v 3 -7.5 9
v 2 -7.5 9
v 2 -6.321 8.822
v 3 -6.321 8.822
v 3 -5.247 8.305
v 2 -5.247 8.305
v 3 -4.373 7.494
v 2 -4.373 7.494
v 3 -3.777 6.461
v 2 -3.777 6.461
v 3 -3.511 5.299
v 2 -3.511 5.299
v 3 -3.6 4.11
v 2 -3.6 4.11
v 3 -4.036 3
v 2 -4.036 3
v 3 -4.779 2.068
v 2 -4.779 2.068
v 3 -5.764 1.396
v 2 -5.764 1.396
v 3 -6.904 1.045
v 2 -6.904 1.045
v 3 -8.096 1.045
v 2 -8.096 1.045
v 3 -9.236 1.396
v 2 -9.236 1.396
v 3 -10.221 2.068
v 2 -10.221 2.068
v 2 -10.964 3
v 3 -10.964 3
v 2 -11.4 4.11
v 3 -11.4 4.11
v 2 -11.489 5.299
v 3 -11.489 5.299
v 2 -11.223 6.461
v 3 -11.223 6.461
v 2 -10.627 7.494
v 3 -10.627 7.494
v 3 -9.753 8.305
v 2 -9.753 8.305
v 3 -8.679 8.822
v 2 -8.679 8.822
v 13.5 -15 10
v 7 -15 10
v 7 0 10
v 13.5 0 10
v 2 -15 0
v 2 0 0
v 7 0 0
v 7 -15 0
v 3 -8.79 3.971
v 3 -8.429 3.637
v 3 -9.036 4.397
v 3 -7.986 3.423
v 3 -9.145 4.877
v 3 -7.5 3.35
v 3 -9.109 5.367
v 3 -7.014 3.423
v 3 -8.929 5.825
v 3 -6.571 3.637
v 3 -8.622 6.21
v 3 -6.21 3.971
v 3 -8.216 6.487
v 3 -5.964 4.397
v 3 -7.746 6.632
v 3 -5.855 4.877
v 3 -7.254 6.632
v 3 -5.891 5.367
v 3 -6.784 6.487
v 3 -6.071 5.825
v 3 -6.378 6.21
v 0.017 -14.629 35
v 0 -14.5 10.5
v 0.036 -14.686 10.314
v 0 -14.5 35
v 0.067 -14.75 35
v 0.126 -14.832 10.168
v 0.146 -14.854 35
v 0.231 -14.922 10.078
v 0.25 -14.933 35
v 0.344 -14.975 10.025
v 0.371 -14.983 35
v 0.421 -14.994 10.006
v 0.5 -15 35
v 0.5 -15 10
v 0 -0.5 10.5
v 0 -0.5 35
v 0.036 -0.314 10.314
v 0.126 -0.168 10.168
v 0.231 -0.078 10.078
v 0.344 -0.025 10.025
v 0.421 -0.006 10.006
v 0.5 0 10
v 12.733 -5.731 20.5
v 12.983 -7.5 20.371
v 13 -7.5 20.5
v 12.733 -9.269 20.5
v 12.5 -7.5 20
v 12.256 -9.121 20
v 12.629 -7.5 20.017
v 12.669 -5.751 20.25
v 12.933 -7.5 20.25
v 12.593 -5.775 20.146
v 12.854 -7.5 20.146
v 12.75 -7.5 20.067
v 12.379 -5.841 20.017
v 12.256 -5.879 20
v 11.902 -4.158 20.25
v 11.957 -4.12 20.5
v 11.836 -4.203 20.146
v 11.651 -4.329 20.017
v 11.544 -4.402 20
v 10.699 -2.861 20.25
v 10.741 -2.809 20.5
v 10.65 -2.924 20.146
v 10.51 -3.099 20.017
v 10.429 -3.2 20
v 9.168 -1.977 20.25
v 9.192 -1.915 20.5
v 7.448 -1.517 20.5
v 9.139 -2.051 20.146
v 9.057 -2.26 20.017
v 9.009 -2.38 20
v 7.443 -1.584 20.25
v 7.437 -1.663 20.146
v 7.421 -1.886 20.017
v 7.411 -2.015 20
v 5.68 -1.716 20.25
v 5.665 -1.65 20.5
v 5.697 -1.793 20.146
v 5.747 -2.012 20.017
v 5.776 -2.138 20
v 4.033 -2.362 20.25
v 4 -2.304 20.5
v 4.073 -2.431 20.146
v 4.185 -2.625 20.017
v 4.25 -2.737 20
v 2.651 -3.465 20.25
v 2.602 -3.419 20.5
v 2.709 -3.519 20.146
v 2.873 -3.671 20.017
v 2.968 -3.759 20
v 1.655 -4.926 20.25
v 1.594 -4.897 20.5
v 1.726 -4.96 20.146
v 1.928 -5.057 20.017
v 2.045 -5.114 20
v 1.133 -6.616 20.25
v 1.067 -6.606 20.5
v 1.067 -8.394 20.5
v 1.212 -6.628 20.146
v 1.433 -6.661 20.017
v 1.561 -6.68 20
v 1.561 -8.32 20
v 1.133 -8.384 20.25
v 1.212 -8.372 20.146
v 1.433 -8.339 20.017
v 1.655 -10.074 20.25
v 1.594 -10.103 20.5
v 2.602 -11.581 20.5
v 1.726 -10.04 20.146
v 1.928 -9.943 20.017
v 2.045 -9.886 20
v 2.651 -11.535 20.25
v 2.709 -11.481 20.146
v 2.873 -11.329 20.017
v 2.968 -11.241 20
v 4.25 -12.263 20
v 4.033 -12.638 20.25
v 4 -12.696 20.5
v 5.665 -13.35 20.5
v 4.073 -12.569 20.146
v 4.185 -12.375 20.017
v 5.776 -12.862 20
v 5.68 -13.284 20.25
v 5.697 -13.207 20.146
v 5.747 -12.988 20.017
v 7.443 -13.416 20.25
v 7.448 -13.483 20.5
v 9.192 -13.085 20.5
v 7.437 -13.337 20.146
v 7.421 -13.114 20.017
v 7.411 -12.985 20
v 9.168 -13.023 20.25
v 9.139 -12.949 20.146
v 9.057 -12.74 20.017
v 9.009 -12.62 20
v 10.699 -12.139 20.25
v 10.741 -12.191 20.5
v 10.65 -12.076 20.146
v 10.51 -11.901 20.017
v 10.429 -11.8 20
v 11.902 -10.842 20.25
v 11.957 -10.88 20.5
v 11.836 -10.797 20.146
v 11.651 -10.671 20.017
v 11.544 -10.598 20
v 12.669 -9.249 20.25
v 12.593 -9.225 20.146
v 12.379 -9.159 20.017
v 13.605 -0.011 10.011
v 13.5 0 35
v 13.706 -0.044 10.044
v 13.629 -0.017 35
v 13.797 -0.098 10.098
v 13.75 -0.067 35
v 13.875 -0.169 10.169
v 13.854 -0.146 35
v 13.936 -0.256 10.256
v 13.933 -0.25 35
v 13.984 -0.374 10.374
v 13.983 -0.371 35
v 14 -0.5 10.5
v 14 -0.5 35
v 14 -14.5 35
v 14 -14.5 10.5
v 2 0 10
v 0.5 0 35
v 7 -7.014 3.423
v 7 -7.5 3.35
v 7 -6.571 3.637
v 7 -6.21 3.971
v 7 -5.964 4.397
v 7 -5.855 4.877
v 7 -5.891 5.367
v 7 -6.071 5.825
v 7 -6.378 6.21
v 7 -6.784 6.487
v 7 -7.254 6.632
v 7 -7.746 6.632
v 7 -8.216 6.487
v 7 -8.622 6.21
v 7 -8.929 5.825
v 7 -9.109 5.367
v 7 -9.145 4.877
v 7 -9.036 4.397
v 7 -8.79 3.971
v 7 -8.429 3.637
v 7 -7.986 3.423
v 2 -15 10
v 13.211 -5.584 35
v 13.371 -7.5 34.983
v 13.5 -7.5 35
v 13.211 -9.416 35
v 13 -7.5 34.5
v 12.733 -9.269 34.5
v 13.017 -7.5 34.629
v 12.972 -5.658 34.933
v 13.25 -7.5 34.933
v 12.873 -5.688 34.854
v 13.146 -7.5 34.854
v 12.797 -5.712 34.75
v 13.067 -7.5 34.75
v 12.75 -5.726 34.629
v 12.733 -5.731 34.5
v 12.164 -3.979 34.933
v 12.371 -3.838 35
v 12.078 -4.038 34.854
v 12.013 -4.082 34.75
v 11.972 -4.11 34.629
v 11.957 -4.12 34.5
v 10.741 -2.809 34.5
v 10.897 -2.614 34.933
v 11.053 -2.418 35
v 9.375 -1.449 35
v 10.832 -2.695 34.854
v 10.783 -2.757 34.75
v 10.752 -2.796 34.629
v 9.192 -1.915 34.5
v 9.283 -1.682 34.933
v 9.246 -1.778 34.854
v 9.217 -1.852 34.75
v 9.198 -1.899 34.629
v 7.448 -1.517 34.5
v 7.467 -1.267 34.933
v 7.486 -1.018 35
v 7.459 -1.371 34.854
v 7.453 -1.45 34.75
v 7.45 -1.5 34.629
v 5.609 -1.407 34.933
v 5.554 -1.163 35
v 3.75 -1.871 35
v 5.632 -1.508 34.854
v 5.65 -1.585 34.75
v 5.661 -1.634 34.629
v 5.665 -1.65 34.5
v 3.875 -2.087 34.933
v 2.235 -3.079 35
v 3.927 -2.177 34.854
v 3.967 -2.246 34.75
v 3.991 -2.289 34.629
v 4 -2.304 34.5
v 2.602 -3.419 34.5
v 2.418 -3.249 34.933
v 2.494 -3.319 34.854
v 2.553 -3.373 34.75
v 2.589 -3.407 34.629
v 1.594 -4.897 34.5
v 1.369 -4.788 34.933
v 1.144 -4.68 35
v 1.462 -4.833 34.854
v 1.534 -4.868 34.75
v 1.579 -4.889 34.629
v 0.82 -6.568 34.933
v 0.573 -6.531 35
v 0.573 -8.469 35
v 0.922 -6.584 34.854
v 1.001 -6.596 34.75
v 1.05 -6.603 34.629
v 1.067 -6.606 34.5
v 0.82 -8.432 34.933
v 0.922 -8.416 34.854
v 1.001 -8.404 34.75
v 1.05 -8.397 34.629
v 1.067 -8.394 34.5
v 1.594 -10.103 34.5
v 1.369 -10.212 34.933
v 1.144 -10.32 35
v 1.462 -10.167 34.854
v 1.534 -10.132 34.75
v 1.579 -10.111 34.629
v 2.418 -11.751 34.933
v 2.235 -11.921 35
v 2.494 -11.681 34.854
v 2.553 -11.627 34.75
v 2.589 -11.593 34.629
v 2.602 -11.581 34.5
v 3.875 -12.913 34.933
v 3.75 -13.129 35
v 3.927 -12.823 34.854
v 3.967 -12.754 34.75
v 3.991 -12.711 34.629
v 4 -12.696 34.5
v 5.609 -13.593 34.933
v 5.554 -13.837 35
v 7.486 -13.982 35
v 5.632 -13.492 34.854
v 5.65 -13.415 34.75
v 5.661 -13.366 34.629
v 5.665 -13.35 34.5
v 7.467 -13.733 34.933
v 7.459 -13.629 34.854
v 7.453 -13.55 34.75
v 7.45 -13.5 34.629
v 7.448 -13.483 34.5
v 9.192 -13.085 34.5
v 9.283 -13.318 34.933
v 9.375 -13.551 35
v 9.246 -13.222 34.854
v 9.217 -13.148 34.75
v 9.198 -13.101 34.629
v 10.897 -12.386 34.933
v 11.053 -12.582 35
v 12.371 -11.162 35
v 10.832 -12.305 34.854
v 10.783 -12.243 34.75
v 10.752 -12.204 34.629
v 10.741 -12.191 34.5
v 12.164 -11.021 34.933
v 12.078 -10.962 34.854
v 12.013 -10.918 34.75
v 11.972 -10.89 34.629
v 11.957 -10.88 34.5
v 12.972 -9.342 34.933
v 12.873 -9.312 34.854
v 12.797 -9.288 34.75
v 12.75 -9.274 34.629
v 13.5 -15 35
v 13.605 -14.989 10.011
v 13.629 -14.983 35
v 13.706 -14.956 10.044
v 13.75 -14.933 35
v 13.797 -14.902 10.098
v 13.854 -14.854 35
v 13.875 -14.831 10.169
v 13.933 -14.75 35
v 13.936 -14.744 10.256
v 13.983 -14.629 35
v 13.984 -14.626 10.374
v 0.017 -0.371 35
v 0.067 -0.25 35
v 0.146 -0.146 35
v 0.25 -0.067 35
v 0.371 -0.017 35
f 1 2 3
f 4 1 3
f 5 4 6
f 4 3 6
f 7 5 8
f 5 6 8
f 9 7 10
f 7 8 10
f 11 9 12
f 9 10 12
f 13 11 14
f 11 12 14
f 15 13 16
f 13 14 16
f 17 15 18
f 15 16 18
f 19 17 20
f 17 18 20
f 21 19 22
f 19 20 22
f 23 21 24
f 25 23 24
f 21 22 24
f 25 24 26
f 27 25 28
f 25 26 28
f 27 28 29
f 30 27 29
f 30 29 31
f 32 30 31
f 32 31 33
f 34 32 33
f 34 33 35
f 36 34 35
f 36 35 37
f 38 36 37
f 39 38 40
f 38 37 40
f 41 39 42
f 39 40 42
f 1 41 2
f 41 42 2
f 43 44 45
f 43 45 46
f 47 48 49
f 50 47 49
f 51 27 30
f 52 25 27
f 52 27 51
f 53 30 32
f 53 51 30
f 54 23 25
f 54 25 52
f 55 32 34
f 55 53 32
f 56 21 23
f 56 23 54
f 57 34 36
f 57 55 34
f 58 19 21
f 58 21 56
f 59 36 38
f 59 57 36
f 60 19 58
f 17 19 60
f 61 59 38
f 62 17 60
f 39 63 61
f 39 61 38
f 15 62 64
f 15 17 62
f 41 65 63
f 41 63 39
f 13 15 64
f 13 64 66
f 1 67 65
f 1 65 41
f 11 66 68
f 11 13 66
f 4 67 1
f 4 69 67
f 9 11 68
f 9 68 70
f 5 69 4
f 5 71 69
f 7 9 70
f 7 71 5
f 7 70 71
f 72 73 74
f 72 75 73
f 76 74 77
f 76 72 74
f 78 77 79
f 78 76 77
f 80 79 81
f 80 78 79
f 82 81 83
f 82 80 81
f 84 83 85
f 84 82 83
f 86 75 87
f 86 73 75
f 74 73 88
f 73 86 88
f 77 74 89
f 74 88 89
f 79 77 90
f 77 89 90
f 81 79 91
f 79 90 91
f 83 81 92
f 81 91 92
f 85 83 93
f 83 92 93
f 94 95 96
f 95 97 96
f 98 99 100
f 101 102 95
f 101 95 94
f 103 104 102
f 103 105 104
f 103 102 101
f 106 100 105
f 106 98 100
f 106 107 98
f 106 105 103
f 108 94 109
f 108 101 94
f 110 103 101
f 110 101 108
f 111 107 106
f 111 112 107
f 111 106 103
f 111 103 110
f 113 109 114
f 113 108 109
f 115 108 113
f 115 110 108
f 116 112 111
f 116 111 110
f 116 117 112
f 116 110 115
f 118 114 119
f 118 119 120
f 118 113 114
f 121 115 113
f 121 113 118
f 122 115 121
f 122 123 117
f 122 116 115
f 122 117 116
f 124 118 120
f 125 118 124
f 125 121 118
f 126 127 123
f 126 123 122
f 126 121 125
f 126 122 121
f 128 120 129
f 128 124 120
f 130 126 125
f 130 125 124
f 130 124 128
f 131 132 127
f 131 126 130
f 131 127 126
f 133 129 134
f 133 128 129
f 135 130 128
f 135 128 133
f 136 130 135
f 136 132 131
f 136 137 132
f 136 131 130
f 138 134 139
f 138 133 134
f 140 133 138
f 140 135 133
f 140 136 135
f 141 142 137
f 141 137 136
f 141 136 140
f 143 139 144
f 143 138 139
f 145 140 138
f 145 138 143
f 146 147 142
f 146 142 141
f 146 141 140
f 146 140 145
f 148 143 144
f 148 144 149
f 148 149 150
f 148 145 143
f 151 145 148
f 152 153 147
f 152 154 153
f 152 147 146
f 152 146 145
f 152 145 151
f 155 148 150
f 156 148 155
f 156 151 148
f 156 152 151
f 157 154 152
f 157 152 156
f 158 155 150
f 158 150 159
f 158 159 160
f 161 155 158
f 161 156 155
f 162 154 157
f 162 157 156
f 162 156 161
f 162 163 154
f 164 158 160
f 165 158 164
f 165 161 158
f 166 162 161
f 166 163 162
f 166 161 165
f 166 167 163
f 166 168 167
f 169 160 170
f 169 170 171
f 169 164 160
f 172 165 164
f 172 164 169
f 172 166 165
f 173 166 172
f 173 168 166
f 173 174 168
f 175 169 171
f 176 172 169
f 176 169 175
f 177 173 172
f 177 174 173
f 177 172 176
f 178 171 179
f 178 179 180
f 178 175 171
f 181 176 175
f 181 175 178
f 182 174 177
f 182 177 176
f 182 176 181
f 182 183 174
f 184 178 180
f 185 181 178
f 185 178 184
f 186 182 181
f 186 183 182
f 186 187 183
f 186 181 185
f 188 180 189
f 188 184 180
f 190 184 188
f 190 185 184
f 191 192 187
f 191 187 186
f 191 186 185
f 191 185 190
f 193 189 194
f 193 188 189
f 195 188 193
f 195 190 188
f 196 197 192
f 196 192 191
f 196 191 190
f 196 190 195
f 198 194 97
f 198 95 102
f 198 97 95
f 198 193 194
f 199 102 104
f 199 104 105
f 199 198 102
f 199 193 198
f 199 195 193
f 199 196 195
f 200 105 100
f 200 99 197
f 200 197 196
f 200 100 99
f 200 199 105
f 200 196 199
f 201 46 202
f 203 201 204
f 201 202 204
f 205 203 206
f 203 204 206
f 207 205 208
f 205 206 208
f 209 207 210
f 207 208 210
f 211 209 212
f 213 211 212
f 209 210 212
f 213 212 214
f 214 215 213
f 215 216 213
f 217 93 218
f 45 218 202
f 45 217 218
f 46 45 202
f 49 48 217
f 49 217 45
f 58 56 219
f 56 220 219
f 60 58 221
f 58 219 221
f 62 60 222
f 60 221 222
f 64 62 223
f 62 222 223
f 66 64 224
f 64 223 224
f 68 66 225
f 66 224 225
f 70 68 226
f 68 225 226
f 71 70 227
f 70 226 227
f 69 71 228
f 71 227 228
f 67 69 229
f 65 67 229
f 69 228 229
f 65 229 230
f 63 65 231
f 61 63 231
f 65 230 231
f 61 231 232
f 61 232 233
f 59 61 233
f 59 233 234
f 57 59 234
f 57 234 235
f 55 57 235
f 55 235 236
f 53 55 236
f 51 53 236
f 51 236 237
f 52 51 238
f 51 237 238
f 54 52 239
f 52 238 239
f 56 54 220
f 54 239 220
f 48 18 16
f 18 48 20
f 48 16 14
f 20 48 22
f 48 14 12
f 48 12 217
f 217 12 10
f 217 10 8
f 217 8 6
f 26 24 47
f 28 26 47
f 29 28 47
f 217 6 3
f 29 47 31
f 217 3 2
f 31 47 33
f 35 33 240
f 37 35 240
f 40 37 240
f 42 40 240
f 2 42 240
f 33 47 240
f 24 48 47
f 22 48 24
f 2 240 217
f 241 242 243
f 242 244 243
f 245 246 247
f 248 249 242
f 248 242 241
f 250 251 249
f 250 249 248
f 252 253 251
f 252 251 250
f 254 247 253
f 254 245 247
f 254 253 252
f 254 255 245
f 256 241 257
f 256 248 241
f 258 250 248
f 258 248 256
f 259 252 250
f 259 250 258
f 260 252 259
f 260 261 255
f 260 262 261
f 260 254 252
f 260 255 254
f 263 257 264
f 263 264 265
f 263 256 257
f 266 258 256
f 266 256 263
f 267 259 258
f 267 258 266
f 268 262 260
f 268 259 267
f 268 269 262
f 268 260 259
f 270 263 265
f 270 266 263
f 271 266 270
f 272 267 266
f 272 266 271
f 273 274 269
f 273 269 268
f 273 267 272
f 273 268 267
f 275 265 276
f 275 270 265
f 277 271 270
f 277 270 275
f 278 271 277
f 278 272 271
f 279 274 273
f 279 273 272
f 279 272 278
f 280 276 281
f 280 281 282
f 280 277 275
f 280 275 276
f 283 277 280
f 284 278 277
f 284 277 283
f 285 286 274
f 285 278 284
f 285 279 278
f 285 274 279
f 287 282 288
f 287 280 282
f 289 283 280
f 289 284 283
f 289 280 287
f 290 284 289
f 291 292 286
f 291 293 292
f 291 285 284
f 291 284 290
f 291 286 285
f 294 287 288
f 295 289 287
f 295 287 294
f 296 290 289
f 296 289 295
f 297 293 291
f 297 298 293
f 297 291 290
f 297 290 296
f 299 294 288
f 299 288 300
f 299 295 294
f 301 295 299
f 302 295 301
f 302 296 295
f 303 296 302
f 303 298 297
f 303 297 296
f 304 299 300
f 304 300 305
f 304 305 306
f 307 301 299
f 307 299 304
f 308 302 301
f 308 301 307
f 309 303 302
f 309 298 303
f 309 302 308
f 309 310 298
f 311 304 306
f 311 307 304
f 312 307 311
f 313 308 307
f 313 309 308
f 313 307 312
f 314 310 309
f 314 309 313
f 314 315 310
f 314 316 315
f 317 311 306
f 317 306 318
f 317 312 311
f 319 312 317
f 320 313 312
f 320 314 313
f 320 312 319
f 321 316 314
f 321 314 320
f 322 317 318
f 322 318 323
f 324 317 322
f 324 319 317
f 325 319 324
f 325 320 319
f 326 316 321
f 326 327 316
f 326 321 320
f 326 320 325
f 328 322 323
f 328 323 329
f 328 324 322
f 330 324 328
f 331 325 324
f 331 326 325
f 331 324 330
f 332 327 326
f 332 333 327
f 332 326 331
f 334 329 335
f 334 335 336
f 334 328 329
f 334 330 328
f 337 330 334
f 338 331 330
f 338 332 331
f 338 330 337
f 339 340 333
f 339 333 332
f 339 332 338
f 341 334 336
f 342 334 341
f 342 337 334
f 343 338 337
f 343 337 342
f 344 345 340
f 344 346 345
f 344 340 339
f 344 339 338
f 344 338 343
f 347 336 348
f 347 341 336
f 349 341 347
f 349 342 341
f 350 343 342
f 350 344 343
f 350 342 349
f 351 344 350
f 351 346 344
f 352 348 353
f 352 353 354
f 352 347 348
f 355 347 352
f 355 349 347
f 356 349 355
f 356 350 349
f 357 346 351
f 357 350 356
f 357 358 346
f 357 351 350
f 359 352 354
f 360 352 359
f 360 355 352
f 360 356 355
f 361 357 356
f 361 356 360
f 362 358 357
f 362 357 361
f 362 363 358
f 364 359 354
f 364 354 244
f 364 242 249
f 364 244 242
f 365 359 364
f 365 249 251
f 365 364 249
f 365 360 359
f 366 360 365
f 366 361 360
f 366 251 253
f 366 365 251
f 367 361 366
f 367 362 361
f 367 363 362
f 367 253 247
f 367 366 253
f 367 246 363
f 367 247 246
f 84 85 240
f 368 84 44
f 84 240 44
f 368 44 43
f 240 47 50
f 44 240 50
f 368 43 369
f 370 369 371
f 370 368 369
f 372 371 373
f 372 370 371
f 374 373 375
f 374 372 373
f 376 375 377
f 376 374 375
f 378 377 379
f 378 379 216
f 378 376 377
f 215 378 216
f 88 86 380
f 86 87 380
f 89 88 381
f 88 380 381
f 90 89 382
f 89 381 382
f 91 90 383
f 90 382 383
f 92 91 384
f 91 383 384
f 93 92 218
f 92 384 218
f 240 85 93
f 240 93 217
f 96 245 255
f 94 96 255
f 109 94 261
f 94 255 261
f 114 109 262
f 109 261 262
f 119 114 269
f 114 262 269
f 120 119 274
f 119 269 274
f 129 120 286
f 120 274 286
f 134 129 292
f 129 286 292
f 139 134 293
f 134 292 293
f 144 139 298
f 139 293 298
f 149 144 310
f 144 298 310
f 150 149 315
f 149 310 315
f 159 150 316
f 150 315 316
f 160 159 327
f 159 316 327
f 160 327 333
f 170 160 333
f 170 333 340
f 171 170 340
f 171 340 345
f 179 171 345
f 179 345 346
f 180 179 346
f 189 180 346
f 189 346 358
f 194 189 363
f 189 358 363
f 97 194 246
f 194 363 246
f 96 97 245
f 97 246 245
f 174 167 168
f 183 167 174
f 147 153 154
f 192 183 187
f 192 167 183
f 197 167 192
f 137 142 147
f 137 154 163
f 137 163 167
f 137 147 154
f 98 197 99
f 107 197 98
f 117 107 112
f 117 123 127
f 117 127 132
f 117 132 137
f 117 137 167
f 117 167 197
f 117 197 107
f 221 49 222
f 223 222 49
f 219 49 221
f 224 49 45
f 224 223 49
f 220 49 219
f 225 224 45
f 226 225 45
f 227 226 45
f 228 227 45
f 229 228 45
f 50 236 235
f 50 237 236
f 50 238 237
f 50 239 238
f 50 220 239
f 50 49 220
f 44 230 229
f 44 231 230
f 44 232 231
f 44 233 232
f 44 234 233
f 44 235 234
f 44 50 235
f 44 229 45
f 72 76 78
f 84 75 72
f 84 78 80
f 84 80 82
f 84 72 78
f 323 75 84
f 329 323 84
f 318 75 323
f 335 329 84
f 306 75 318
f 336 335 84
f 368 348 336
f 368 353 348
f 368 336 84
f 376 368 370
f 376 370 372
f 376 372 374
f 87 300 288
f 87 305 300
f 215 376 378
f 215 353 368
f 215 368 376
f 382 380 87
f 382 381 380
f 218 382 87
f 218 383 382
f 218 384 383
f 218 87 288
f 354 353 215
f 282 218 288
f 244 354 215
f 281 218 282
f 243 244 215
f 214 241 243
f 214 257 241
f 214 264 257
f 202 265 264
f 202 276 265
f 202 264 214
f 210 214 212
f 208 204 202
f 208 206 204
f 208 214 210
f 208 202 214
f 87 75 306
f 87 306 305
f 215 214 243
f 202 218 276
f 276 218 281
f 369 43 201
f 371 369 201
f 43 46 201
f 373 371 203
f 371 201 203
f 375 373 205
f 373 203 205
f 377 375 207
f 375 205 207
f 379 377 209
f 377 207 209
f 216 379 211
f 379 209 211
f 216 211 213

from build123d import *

# Parameters (mm, degrees)
SKETCH_1_W             = 14
SKETCH_1_H             = 15
EXTRUDE_1_DEPTH        = 35
SKETCH_2_R             = 6
CUT_EXTRUDE_1_DEPTH    = 15
CUT_EXTRUDE_2_REACH    = 17
SKETCH_3_W             = 2
SKETCH_3_H             = 10
SKETCH_3_W_2           = 7
HOLE_WIZARD_M4_1_D     = 3.3
HOLE_WIZARD_M4_1_DEPTH = 5
SKETCH_4_R             = 4
CUT_EXTRUDE_3_DEPTH    = 1
FILLET_1_R             = 0.5


with BuildPart() as part:
    # 草图1 → 凸台-拉伸1 (new body)
    with BuildSketch(Plane.XY):
        with Locations((7, -7.5)):
            Rectangle(SKETCH_1_W, SKETCH_1_H)
    extrude(amount=EXTRUDE_1_DEPTH)

    # 草图2 → 切除-拉伸1 (cut)
    with BuildSketch(Plane.XY.offset(35)):
        with Locations((7, -7.5)):
            Circle(SKETCH_2_R)
    extrude(amount=-CUT_EXTRUDE_1_DEPTH, mode=Mode.SUBTRACT)

    # 草图3 → 切除-拉伸2 (cut, up to next)
    with BuildSketch(Plane.XZ.offset(15), mode=Mode.PRIVATE) as cut_extrude_2_sk1:
        with Locations((1, 5)):
            Rectangle(SKETCH_3_W, SKETCH_3_H)
    cut_extrude_2_tool1 = extrude(cut_extrude_2_sk1.sketch, amount=-CUT_EXTRUDE_2_REACH, mode=Mode.PRIVATE) & part.part
    add(cut_extrude_2_tool1.solids().sort_by_distance((1, -15, 5))[0], mode=Mode.SUBTRACT)
    # 草图3 → 切除-拉伸2 (cut, up to next)
    with BuildSketch(Plane.XZ.offset(15), mode=Mode.PRIVATE) as cut_extrude_2_sk2:
        with Locations((10.5, 5)):
            Rectangle(SKETCH_3_W_2, SKETCH_3_H)
    cut_extrude_2_tool2 = extrude(cut_extrude_2_sk2.sketch, amount=-CUT_EXTRUDE_2_REACH, mode=Mode.PRIVATE) & part.part
    add(cut_extrude_2_tool2.solids().sort_by_distance((10.5, -15, 5))[0], mode=Mode.SUBTRACT)

    # M4 螺纹孔1
    with Locations(Plane.ZY.offset(-2)):
        with Locations((5, -7.5)):
            Hole(HOLE_WIZARD_M4_1_D / 2, depth=HOLE_WIZARD_M4_1_DEPTH)

    # 草图4 → 切除-拉伸3 (cut)
    with BuildSketch(Plane.ZY.offset(-2)):
        with Locations((5, -7.5)):
            Circle(SKETCH_4_R)
    extrude(amount=-CUT_EXTRUDE_3_DEPTH, mode=Mode.SUBTRACT)

    # 圆角1
    fillet_1_edges = [part.edges().sort_by_distance(p)[0] for p in [
        (1, -7.5, 20),
        (1, -7.5, 35),
        (0, -7.5, 10),
        (14, -7.5, 10),
        (0, 0, 22.5),
        (14, 0, 22.5),
        (14, -15, 22.5),
        (0, -15, 22.5),
    ]]
    fillet(fillet_1_edges, radius=FILLET_1_R)


solid = part.part
